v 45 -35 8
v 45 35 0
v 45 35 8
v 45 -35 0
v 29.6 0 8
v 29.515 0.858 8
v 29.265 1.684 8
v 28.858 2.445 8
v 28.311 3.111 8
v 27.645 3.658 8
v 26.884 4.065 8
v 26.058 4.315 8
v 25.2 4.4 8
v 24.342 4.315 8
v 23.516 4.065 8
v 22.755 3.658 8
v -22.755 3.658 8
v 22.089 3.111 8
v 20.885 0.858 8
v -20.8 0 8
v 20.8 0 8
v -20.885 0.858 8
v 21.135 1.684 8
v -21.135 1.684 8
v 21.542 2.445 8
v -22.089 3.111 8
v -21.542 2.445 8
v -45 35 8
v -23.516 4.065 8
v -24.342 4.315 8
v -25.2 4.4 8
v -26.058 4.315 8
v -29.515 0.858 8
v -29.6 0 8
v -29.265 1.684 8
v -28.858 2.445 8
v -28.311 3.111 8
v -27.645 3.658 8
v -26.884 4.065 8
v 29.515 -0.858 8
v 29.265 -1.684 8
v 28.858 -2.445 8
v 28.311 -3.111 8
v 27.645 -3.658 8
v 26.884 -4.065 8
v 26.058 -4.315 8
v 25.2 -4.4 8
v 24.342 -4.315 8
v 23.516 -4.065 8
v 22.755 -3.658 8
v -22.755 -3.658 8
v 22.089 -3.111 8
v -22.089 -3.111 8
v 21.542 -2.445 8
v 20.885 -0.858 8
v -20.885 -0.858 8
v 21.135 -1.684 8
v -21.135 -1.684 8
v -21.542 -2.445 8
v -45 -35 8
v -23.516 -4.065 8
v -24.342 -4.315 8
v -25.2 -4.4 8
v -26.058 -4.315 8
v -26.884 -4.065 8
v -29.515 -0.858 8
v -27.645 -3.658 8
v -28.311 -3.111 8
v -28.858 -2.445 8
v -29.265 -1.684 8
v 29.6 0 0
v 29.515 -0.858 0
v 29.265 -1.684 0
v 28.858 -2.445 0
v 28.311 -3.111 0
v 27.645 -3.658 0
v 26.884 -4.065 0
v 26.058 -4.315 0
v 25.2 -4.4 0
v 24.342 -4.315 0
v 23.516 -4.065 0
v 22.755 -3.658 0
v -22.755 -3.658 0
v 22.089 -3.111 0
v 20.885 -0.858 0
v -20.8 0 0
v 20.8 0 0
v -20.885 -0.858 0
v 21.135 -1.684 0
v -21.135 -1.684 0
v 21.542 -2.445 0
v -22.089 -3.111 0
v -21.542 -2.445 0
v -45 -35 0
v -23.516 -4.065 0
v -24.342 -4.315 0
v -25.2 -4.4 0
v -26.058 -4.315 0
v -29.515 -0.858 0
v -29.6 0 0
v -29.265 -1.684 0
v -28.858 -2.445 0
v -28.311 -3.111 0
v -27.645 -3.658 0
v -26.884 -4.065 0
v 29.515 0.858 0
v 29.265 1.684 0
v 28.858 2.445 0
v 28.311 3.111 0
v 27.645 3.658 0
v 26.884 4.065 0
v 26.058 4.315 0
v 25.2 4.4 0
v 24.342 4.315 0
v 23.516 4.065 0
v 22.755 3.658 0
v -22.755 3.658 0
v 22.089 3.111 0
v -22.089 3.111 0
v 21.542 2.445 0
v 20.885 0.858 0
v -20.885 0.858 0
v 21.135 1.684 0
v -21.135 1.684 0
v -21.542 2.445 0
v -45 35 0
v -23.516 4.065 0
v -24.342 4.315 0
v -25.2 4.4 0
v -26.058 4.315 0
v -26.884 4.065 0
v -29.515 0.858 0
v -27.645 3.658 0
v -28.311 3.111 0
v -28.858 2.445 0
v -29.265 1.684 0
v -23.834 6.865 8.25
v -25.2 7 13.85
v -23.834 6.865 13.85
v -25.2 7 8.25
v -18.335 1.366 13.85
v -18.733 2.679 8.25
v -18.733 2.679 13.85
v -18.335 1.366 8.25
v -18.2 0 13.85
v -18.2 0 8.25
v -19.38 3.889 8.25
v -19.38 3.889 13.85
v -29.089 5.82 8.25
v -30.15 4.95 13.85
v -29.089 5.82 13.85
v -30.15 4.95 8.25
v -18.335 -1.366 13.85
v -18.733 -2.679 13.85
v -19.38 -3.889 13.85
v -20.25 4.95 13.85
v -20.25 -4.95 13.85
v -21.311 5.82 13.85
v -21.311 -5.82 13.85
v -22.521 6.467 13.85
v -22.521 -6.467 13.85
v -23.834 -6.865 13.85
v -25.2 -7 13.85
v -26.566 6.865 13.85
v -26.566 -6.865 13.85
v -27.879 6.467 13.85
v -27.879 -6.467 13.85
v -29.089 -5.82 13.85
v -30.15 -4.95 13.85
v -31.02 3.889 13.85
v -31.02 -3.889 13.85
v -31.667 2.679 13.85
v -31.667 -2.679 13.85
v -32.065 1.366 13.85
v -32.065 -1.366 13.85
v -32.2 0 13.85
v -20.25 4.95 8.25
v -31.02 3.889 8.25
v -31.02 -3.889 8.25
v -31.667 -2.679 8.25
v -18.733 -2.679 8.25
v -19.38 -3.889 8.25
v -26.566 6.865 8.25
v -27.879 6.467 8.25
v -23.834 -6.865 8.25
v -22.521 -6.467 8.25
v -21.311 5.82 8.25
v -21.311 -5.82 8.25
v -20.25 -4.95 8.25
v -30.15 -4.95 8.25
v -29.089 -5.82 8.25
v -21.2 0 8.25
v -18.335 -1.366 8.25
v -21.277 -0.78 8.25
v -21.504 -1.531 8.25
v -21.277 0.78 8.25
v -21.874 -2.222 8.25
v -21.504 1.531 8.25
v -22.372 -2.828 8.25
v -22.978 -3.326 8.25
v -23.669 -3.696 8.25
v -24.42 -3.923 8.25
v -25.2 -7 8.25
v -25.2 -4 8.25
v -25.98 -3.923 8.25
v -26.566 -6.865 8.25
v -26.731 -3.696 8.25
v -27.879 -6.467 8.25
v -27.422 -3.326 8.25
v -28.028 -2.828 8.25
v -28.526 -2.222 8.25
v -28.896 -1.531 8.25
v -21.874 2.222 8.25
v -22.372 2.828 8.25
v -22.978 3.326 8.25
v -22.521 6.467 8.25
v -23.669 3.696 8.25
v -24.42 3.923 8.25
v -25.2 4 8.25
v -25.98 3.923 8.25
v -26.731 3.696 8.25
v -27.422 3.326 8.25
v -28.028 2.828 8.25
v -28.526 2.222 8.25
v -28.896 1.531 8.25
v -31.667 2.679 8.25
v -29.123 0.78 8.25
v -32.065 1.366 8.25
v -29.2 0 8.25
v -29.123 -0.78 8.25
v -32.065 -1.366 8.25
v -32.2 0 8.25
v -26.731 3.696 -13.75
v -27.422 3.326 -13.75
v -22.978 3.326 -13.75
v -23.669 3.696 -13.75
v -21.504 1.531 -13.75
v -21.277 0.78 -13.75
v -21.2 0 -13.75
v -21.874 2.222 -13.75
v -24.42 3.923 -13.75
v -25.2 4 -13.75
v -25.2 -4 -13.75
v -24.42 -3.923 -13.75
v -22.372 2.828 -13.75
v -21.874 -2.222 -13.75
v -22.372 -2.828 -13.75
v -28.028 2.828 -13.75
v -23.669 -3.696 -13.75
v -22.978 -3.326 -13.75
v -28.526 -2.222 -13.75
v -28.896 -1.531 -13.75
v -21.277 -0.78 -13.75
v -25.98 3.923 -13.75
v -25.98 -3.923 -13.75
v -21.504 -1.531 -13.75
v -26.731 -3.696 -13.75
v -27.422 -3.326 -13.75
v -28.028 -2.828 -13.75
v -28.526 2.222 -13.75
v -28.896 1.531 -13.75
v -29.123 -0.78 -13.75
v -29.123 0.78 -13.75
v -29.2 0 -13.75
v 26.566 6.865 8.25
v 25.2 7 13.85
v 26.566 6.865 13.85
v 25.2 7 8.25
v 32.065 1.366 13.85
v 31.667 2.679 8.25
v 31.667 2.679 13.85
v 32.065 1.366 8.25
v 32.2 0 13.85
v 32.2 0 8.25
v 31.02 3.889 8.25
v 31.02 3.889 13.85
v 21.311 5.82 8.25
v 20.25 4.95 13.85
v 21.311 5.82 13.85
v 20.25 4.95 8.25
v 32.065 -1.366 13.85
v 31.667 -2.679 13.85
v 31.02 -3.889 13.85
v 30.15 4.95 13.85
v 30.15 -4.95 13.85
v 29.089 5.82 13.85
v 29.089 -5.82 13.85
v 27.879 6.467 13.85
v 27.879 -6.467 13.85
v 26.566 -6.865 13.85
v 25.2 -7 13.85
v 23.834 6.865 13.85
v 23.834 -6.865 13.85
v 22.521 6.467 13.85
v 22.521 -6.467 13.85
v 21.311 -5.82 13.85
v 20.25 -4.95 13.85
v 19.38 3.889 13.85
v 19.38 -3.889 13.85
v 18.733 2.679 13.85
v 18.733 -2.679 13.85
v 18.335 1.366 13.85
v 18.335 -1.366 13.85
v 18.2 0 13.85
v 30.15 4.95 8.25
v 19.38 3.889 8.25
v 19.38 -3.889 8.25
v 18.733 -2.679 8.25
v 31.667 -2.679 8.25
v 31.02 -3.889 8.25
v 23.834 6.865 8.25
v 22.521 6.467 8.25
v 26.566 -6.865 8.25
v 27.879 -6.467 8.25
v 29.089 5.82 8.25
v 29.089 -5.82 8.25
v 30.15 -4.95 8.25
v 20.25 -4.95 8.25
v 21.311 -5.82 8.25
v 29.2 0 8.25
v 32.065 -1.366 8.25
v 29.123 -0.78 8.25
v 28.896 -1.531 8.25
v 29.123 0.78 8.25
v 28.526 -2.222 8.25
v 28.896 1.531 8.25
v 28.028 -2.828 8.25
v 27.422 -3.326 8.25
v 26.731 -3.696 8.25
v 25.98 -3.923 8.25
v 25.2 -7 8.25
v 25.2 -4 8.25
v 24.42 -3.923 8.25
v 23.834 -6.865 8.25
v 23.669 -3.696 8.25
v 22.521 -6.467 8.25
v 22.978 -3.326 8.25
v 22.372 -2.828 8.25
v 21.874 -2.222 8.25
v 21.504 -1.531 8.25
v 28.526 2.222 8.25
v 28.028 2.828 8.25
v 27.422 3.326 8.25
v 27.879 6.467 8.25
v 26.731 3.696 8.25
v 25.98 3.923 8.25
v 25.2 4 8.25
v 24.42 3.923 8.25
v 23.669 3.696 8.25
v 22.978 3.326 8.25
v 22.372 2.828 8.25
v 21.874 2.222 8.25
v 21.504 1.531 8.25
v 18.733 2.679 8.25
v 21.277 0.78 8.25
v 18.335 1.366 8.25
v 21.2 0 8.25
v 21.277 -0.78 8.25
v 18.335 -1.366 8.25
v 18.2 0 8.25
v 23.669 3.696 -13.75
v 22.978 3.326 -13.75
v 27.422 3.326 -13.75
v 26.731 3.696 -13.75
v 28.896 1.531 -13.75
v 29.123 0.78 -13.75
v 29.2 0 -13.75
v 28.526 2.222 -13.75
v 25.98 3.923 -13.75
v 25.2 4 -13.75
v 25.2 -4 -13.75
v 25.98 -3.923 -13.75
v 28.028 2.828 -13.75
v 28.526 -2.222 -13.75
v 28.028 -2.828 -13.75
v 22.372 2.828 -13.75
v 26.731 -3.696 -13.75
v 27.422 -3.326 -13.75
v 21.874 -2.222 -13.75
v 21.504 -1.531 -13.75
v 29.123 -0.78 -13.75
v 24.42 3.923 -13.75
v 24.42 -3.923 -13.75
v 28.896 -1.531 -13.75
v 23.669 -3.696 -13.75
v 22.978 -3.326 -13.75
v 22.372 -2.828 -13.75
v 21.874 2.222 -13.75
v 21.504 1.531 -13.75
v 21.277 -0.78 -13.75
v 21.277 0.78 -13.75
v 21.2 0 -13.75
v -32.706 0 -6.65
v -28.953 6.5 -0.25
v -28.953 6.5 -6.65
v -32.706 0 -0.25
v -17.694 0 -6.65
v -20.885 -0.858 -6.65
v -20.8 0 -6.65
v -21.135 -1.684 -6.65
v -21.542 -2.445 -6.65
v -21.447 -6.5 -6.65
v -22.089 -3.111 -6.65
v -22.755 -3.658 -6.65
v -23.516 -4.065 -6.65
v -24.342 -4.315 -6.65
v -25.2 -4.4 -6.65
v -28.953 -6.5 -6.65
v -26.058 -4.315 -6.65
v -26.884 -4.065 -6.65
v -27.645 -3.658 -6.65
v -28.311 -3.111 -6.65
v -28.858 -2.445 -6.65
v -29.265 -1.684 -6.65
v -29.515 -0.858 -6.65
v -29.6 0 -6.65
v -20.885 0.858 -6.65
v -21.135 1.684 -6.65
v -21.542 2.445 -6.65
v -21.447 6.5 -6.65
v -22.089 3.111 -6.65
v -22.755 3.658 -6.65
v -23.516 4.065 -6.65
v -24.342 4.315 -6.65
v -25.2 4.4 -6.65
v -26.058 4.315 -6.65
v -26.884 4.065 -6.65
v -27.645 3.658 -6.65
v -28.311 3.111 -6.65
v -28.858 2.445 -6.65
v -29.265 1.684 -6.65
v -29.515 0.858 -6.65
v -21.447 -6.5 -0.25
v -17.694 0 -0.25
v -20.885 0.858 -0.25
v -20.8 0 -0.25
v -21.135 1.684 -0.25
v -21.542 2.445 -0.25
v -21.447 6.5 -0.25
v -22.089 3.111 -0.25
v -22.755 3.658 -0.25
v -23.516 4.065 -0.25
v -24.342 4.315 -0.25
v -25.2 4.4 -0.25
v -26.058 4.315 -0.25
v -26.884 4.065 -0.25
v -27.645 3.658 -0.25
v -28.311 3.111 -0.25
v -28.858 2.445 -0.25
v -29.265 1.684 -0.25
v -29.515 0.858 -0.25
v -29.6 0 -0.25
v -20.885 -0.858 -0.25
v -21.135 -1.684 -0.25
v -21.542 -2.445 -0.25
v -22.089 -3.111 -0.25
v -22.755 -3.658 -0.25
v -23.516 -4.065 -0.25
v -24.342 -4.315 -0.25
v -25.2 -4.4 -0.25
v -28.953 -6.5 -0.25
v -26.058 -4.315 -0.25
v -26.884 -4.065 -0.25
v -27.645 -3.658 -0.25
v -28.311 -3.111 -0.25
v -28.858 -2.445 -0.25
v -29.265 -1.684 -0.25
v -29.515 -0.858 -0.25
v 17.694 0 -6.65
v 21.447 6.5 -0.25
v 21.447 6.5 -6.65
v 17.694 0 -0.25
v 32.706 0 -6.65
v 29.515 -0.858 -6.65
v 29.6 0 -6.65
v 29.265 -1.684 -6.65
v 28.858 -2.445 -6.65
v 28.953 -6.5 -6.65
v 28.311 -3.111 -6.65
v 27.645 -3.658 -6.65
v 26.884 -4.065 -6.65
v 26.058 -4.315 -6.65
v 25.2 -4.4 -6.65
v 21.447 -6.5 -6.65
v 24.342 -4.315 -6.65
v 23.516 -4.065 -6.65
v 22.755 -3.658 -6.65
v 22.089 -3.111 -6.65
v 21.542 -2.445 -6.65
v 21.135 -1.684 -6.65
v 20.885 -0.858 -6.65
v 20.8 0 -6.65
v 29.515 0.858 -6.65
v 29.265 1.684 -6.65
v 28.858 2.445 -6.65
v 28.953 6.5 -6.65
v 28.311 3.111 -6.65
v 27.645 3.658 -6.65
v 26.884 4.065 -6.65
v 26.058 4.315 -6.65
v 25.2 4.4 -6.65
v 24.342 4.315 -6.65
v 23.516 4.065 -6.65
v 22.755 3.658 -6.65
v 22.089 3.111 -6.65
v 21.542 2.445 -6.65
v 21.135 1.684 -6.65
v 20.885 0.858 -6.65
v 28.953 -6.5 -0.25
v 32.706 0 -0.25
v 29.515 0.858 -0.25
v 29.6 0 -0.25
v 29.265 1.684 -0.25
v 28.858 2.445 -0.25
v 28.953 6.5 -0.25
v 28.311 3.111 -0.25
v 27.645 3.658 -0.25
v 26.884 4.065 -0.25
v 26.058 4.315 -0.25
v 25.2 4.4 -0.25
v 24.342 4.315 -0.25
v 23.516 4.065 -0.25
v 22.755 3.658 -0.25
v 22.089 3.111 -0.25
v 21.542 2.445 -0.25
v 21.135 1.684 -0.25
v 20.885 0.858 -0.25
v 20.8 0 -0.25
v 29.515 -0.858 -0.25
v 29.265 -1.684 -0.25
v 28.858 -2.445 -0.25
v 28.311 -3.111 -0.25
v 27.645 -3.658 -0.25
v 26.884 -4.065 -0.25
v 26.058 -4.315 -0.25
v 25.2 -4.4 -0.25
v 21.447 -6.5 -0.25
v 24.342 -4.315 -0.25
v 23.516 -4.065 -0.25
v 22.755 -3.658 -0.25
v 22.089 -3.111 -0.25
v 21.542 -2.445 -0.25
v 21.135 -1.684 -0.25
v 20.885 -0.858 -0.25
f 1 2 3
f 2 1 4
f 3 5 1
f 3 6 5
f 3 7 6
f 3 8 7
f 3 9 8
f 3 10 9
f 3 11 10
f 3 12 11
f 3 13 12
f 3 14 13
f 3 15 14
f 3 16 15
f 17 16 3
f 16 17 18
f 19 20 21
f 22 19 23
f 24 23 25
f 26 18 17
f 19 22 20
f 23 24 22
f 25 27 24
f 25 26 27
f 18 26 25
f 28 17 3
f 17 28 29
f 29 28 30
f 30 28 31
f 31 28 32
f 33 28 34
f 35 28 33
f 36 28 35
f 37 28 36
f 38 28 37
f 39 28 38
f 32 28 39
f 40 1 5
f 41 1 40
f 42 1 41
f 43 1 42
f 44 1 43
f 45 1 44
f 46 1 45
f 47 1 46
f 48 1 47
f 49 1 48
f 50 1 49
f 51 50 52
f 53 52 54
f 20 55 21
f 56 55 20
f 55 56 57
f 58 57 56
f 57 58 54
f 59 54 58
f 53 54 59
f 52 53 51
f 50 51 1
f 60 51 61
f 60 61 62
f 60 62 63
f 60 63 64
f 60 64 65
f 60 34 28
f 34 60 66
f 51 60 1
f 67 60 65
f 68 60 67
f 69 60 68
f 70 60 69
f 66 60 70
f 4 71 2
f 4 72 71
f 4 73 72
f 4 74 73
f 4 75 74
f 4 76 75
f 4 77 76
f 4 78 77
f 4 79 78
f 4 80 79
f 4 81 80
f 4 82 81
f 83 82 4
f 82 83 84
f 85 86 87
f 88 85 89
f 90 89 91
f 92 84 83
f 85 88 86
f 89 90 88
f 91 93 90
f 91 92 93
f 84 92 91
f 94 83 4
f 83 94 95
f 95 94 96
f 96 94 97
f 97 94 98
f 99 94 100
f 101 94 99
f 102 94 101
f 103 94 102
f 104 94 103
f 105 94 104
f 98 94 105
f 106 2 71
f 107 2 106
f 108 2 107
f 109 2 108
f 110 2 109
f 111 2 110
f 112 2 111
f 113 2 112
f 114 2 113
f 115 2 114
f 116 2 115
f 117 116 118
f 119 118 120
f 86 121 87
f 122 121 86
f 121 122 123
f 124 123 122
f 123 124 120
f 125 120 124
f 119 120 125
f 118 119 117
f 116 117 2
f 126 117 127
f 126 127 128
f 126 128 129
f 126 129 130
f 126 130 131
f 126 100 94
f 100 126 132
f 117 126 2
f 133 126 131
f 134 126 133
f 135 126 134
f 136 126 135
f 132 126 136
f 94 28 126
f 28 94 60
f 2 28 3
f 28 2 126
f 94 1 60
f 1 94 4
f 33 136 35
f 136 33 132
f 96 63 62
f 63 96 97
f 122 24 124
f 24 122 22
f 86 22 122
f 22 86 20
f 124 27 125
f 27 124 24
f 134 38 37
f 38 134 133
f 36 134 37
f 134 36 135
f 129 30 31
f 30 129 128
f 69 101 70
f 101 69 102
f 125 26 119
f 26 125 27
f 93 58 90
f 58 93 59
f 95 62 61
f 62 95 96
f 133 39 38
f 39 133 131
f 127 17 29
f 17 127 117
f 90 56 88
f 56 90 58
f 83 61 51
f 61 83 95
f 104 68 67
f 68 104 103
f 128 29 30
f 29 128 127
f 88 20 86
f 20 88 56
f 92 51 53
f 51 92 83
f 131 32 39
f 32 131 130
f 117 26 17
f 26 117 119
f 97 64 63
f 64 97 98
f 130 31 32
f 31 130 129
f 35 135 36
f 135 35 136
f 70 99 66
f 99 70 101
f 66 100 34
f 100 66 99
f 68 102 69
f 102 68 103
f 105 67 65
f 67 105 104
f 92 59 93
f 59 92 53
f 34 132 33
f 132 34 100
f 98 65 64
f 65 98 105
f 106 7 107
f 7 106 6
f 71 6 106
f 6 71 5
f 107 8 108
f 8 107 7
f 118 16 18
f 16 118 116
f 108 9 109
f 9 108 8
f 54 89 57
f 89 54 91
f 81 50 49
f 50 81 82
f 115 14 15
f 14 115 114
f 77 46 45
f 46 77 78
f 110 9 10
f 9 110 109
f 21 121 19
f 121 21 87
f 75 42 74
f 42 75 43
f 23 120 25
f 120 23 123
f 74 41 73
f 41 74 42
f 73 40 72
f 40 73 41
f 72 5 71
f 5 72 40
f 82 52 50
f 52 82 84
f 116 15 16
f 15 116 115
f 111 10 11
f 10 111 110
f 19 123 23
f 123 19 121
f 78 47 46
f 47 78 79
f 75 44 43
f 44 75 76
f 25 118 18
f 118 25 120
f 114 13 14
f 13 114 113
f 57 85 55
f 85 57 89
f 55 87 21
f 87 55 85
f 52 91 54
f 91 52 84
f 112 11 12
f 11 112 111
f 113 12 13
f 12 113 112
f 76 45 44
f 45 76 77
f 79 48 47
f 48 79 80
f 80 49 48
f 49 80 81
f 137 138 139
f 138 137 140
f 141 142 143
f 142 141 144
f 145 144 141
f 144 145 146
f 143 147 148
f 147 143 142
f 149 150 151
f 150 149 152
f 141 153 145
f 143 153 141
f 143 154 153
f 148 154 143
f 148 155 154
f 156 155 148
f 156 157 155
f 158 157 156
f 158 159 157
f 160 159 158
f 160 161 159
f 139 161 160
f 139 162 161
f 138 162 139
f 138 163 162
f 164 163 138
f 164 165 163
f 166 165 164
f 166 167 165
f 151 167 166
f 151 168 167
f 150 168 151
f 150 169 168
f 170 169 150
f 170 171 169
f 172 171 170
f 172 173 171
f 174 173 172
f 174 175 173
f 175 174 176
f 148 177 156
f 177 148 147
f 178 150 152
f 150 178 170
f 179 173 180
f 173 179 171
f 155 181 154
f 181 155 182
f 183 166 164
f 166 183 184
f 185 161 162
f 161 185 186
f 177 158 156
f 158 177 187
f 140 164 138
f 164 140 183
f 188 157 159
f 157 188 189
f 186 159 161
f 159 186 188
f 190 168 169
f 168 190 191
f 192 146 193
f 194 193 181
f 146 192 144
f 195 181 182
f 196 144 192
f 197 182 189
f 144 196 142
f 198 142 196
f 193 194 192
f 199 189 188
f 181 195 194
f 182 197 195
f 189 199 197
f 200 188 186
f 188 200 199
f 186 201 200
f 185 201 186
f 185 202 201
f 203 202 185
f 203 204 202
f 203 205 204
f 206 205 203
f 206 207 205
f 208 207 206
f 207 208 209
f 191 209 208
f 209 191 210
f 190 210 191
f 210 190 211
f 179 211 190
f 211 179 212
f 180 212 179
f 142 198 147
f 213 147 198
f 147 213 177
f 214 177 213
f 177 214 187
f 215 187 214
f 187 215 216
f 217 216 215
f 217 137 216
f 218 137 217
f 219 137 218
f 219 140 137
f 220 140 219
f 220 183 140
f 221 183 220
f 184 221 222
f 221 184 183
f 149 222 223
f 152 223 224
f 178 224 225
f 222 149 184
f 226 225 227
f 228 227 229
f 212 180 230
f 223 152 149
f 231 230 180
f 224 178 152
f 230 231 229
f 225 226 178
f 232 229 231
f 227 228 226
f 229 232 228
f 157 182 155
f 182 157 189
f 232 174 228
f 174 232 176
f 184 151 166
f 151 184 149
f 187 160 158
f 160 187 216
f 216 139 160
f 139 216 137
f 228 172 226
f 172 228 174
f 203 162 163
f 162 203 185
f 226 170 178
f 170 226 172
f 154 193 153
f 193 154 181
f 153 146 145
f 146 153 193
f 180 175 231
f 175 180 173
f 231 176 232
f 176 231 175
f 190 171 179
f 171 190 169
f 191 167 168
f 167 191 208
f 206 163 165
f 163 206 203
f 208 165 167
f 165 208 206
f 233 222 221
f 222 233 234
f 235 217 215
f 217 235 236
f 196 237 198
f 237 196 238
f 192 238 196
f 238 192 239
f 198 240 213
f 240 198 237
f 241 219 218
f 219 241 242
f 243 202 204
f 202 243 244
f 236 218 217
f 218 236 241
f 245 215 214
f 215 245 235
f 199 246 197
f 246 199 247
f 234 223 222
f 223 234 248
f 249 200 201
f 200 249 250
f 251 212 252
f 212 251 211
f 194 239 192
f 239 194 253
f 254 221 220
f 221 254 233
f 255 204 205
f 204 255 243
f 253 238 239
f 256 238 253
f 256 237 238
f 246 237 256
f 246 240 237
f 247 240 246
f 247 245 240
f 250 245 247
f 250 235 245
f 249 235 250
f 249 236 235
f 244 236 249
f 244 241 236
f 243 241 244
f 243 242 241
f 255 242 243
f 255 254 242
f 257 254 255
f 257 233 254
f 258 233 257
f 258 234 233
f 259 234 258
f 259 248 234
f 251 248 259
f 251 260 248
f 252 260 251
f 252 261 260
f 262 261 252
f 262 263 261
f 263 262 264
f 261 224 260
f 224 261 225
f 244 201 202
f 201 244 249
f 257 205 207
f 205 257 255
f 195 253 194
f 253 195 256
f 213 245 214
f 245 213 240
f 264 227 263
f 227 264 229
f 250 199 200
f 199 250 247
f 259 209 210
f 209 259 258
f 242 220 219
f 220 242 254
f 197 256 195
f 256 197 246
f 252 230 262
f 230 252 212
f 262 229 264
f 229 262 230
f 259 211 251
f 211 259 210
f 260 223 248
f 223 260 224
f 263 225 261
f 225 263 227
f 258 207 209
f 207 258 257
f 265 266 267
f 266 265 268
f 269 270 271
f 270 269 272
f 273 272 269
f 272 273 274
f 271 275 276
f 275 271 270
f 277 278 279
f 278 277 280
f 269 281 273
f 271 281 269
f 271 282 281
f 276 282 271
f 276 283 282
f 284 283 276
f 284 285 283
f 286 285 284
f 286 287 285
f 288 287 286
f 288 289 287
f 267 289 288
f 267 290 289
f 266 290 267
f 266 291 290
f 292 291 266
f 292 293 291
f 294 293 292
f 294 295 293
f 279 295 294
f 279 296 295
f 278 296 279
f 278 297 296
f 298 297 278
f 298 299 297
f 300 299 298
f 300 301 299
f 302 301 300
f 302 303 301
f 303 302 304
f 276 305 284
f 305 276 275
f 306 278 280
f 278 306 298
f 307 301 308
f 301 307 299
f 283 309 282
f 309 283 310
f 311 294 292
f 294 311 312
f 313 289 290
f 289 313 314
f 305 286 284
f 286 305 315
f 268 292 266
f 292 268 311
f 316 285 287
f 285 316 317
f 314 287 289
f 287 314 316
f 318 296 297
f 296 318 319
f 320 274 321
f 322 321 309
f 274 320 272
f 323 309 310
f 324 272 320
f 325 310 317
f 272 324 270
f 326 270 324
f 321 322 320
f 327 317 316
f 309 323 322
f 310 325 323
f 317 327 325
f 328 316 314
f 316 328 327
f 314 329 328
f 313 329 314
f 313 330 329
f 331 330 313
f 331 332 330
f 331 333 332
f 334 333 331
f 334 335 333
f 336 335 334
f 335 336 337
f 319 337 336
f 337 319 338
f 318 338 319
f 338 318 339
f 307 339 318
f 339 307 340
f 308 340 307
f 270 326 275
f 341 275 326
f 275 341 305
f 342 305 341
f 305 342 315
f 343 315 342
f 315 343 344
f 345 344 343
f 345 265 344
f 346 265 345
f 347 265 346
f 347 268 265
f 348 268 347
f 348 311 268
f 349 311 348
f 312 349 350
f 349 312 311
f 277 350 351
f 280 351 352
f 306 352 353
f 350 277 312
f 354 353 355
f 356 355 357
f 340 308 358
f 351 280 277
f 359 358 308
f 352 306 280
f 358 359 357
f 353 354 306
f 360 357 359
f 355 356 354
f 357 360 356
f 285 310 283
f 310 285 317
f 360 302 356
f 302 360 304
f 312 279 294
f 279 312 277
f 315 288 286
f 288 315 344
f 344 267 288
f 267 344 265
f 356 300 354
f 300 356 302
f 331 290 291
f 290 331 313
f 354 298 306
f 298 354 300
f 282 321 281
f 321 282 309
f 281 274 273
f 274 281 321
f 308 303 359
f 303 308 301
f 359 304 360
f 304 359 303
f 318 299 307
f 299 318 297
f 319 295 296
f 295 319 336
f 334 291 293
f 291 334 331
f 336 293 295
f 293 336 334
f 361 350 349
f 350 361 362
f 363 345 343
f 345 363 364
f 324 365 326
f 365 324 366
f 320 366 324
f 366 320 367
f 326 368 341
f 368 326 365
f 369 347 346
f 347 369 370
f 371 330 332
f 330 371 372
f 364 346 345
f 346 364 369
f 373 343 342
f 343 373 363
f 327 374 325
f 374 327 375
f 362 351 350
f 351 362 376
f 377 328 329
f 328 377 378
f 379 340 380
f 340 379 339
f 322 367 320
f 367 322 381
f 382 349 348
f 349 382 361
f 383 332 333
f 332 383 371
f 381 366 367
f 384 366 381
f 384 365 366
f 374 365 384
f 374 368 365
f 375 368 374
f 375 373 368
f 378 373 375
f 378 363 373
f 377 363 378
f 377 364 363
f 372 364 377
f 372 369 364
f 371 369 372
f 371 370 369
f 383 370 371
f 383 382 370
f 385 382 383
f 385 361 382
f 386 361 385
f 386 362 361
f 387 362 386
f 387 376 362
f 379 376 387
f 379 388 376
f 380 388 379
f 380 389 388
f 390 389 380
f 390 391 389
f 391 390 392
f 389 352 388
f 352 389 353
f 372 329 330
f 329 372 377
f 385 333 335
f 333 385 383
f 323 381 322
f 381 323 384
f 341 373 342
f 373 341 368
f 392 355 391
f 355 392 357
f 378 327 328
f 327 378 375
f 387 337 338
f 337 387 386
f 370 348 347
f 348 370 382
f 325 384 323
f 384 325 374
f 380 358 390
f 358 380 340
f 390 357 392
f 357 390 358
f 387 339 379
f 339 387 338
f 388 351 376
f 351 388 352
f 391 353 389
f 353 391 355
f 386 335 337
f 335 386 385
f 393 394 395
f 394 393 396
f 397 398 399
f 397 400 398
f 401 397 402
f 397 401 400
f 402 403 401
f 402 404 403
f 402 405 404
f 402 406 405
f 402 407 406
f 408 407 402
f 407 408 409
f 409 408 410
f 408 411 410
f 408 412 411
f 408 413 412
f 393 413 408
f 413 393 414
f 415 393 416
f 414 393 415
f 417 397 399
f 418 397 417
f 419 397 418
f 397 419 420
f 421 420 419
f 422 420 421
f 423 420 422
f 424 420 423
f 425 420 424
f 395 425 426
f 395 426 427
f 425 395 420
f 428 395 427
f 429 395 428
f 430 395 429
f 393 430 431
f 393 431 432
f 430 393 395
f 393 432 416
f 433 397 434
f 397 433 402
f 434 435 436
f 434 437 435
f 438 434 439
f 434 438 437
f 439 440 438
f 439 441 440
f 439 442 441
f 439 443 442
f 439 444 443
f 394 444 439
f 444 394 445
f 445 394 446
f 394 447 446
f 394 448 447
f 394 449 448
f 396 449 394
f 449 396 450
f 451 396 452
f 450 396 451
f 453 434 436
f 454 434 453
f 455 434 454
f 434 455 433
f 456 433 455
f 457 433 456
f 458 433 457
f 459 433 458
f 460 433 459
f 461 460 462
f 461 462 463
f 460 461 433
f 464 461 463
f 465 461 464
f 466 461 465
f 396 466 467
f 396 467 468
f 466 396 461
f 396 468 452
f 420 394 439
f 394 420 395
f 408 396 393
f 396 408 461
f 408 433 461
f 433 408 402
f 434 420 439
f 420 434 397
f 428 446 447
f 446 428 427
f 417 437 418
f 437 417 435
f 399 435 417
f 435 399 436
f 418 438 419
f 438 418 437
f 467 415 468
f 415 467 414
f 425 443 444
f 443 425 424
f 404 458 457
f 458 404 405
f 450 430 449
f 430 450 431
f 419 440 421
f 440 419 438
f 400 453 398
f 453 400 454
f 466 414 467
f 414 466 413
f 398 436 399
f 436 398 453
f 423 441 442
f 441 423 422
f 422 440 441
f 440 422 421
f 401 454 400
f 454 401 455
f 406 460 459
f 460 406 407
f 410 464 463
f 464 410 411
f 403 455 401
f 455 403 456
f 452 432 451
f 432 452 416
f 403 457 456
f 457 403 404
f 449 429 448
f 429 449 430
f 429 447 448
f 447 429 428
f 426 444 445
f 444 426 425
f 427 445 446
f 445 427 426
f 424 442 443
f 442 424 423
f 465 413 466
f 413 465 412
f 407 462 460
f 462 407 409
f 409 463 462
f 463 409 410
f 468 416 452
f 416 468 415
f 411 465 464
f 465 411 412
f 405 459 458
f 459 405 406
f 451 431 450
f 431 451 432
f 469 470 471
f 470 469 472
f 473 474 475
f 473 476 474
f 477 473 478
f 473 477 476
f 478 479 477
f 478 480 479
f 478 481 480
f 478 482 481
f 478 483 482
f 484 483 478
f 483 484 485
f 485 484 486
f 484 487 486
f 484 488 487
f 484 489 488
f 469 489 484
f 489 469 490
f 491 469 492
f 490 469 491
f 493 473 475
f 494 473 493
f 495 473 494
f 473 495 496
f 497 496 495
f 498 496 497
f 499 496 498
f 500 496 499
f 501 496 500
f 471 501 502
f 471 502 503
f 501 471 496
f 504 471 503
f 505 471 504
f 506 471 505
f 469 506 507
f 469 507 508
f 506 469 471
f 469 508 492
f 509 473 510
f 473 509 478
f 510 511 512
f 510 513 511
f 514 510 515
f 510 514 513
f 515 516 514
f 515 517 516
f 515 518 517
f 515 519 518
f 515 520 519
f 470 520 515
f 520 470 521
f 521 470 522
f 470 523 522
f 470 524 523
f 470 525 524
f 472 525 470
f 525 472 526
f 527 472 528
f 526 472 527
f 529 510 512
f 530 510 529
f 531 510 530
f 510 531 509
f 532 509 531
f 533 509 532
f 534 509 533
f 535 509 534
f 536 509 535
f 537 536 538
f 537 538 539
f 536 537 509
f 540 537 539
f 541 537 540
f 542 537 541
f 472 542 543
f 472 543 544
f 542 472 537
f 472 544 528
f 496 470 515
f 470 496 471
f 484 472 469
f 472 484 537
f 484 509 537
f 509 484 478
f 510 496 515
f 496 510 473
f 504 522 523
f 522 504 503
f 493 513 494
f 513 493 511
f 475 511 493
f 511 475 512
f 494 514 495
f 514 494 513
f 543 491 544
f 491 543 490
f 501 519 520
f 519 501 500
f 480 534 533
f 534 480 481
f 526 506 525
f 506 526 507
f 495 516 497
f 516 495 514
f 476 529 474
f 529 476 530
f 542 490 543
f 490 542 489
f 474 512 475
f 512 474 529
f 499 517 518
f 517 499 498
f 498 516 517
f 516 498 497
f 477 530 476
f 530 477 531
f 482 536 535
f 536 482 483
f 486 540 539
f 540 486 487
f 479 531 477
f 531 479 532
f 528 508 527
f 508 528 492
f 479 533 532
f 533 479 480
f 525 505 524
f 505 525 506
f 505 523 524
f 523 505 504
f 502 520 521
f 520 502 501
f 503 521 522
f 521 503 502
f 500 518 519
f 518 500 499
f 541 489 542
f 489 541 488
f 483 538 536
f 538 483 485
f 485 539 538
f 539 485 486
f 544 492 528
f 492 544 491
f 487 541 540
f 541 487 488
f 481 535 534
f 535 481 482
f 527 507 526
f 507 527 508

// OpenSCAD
$fn = 32;

// ------------------------------------------------------------------------
// Bolted plate: 90 x 70 x 8 mm plate, 2 fasteners
// Every part is its own module, assembly() places them once.
// ------------------------------------------------------------------------

// --- part 1 ---
module plate() {
  difference() {
    translate([-45, -35, 0]) cube([90, 70, 8]);
    translate([-25.2, 0, -1]) cylinder(h = 10, d = 8.8);
    translate([25.2, 0, -1]) cylinder(h = 10, d = 8.8);
  }
}

// --- part 2 ---
module bolt1() {
  cylinder(h = 5.6, d = 14);
  translate([0, 0, -22]) cylinder(h = 22, d = 8);
}

// --- part 3 ---
module bolt2() {
  cylinder(h = 5.6, d = 14);
  translate([0, 0, -22]) cylinder(h = 22, d = 8);
}

// --- part 4 ---
module nut1() {
  difference() {
    linear_extrude(height = 6.4) polygon(points = [[7.506, 0], [3.753, 6.5], [-3.753, 6.5], [-7.506, 0], [-3.753, -6.5], [3.753, -6.5]]);
    translate([0, 0, -1]) cylinder(h = 8.4, d = 8.8);
  }
}

// --- part 5 ---
module nut2() {
  difference() {
    linear_extrude(height = 6.4) polygon(points = [[7.506, 0], [3.753, 6.5], [-3.753, 6.5], [-7.506, 0], [-3.753, -6.5], [3.753, -6.5]]);
    translate([0, 0, -1]) cylinder(h = 8.4, d = 8.8);
  }
}

// --- assembly ---
module assembly() {
  translate([0, 0, 0]) rotate([0, 0, 0]) plate();
  translate([-25.2, 0, 8.25]) rotate([0, 0, 0]) bolt1();
  translate([25.2, 0, 8.25]) rotate([0, 0, 0]) bolt2();
  translate([-25.2, 0, -6.65]) rotate([0, 0, 0]) nut1();
  translate([25.2, 0, -6.65]) rotate([0, 0, 0]) nut2();
}

assembly();
